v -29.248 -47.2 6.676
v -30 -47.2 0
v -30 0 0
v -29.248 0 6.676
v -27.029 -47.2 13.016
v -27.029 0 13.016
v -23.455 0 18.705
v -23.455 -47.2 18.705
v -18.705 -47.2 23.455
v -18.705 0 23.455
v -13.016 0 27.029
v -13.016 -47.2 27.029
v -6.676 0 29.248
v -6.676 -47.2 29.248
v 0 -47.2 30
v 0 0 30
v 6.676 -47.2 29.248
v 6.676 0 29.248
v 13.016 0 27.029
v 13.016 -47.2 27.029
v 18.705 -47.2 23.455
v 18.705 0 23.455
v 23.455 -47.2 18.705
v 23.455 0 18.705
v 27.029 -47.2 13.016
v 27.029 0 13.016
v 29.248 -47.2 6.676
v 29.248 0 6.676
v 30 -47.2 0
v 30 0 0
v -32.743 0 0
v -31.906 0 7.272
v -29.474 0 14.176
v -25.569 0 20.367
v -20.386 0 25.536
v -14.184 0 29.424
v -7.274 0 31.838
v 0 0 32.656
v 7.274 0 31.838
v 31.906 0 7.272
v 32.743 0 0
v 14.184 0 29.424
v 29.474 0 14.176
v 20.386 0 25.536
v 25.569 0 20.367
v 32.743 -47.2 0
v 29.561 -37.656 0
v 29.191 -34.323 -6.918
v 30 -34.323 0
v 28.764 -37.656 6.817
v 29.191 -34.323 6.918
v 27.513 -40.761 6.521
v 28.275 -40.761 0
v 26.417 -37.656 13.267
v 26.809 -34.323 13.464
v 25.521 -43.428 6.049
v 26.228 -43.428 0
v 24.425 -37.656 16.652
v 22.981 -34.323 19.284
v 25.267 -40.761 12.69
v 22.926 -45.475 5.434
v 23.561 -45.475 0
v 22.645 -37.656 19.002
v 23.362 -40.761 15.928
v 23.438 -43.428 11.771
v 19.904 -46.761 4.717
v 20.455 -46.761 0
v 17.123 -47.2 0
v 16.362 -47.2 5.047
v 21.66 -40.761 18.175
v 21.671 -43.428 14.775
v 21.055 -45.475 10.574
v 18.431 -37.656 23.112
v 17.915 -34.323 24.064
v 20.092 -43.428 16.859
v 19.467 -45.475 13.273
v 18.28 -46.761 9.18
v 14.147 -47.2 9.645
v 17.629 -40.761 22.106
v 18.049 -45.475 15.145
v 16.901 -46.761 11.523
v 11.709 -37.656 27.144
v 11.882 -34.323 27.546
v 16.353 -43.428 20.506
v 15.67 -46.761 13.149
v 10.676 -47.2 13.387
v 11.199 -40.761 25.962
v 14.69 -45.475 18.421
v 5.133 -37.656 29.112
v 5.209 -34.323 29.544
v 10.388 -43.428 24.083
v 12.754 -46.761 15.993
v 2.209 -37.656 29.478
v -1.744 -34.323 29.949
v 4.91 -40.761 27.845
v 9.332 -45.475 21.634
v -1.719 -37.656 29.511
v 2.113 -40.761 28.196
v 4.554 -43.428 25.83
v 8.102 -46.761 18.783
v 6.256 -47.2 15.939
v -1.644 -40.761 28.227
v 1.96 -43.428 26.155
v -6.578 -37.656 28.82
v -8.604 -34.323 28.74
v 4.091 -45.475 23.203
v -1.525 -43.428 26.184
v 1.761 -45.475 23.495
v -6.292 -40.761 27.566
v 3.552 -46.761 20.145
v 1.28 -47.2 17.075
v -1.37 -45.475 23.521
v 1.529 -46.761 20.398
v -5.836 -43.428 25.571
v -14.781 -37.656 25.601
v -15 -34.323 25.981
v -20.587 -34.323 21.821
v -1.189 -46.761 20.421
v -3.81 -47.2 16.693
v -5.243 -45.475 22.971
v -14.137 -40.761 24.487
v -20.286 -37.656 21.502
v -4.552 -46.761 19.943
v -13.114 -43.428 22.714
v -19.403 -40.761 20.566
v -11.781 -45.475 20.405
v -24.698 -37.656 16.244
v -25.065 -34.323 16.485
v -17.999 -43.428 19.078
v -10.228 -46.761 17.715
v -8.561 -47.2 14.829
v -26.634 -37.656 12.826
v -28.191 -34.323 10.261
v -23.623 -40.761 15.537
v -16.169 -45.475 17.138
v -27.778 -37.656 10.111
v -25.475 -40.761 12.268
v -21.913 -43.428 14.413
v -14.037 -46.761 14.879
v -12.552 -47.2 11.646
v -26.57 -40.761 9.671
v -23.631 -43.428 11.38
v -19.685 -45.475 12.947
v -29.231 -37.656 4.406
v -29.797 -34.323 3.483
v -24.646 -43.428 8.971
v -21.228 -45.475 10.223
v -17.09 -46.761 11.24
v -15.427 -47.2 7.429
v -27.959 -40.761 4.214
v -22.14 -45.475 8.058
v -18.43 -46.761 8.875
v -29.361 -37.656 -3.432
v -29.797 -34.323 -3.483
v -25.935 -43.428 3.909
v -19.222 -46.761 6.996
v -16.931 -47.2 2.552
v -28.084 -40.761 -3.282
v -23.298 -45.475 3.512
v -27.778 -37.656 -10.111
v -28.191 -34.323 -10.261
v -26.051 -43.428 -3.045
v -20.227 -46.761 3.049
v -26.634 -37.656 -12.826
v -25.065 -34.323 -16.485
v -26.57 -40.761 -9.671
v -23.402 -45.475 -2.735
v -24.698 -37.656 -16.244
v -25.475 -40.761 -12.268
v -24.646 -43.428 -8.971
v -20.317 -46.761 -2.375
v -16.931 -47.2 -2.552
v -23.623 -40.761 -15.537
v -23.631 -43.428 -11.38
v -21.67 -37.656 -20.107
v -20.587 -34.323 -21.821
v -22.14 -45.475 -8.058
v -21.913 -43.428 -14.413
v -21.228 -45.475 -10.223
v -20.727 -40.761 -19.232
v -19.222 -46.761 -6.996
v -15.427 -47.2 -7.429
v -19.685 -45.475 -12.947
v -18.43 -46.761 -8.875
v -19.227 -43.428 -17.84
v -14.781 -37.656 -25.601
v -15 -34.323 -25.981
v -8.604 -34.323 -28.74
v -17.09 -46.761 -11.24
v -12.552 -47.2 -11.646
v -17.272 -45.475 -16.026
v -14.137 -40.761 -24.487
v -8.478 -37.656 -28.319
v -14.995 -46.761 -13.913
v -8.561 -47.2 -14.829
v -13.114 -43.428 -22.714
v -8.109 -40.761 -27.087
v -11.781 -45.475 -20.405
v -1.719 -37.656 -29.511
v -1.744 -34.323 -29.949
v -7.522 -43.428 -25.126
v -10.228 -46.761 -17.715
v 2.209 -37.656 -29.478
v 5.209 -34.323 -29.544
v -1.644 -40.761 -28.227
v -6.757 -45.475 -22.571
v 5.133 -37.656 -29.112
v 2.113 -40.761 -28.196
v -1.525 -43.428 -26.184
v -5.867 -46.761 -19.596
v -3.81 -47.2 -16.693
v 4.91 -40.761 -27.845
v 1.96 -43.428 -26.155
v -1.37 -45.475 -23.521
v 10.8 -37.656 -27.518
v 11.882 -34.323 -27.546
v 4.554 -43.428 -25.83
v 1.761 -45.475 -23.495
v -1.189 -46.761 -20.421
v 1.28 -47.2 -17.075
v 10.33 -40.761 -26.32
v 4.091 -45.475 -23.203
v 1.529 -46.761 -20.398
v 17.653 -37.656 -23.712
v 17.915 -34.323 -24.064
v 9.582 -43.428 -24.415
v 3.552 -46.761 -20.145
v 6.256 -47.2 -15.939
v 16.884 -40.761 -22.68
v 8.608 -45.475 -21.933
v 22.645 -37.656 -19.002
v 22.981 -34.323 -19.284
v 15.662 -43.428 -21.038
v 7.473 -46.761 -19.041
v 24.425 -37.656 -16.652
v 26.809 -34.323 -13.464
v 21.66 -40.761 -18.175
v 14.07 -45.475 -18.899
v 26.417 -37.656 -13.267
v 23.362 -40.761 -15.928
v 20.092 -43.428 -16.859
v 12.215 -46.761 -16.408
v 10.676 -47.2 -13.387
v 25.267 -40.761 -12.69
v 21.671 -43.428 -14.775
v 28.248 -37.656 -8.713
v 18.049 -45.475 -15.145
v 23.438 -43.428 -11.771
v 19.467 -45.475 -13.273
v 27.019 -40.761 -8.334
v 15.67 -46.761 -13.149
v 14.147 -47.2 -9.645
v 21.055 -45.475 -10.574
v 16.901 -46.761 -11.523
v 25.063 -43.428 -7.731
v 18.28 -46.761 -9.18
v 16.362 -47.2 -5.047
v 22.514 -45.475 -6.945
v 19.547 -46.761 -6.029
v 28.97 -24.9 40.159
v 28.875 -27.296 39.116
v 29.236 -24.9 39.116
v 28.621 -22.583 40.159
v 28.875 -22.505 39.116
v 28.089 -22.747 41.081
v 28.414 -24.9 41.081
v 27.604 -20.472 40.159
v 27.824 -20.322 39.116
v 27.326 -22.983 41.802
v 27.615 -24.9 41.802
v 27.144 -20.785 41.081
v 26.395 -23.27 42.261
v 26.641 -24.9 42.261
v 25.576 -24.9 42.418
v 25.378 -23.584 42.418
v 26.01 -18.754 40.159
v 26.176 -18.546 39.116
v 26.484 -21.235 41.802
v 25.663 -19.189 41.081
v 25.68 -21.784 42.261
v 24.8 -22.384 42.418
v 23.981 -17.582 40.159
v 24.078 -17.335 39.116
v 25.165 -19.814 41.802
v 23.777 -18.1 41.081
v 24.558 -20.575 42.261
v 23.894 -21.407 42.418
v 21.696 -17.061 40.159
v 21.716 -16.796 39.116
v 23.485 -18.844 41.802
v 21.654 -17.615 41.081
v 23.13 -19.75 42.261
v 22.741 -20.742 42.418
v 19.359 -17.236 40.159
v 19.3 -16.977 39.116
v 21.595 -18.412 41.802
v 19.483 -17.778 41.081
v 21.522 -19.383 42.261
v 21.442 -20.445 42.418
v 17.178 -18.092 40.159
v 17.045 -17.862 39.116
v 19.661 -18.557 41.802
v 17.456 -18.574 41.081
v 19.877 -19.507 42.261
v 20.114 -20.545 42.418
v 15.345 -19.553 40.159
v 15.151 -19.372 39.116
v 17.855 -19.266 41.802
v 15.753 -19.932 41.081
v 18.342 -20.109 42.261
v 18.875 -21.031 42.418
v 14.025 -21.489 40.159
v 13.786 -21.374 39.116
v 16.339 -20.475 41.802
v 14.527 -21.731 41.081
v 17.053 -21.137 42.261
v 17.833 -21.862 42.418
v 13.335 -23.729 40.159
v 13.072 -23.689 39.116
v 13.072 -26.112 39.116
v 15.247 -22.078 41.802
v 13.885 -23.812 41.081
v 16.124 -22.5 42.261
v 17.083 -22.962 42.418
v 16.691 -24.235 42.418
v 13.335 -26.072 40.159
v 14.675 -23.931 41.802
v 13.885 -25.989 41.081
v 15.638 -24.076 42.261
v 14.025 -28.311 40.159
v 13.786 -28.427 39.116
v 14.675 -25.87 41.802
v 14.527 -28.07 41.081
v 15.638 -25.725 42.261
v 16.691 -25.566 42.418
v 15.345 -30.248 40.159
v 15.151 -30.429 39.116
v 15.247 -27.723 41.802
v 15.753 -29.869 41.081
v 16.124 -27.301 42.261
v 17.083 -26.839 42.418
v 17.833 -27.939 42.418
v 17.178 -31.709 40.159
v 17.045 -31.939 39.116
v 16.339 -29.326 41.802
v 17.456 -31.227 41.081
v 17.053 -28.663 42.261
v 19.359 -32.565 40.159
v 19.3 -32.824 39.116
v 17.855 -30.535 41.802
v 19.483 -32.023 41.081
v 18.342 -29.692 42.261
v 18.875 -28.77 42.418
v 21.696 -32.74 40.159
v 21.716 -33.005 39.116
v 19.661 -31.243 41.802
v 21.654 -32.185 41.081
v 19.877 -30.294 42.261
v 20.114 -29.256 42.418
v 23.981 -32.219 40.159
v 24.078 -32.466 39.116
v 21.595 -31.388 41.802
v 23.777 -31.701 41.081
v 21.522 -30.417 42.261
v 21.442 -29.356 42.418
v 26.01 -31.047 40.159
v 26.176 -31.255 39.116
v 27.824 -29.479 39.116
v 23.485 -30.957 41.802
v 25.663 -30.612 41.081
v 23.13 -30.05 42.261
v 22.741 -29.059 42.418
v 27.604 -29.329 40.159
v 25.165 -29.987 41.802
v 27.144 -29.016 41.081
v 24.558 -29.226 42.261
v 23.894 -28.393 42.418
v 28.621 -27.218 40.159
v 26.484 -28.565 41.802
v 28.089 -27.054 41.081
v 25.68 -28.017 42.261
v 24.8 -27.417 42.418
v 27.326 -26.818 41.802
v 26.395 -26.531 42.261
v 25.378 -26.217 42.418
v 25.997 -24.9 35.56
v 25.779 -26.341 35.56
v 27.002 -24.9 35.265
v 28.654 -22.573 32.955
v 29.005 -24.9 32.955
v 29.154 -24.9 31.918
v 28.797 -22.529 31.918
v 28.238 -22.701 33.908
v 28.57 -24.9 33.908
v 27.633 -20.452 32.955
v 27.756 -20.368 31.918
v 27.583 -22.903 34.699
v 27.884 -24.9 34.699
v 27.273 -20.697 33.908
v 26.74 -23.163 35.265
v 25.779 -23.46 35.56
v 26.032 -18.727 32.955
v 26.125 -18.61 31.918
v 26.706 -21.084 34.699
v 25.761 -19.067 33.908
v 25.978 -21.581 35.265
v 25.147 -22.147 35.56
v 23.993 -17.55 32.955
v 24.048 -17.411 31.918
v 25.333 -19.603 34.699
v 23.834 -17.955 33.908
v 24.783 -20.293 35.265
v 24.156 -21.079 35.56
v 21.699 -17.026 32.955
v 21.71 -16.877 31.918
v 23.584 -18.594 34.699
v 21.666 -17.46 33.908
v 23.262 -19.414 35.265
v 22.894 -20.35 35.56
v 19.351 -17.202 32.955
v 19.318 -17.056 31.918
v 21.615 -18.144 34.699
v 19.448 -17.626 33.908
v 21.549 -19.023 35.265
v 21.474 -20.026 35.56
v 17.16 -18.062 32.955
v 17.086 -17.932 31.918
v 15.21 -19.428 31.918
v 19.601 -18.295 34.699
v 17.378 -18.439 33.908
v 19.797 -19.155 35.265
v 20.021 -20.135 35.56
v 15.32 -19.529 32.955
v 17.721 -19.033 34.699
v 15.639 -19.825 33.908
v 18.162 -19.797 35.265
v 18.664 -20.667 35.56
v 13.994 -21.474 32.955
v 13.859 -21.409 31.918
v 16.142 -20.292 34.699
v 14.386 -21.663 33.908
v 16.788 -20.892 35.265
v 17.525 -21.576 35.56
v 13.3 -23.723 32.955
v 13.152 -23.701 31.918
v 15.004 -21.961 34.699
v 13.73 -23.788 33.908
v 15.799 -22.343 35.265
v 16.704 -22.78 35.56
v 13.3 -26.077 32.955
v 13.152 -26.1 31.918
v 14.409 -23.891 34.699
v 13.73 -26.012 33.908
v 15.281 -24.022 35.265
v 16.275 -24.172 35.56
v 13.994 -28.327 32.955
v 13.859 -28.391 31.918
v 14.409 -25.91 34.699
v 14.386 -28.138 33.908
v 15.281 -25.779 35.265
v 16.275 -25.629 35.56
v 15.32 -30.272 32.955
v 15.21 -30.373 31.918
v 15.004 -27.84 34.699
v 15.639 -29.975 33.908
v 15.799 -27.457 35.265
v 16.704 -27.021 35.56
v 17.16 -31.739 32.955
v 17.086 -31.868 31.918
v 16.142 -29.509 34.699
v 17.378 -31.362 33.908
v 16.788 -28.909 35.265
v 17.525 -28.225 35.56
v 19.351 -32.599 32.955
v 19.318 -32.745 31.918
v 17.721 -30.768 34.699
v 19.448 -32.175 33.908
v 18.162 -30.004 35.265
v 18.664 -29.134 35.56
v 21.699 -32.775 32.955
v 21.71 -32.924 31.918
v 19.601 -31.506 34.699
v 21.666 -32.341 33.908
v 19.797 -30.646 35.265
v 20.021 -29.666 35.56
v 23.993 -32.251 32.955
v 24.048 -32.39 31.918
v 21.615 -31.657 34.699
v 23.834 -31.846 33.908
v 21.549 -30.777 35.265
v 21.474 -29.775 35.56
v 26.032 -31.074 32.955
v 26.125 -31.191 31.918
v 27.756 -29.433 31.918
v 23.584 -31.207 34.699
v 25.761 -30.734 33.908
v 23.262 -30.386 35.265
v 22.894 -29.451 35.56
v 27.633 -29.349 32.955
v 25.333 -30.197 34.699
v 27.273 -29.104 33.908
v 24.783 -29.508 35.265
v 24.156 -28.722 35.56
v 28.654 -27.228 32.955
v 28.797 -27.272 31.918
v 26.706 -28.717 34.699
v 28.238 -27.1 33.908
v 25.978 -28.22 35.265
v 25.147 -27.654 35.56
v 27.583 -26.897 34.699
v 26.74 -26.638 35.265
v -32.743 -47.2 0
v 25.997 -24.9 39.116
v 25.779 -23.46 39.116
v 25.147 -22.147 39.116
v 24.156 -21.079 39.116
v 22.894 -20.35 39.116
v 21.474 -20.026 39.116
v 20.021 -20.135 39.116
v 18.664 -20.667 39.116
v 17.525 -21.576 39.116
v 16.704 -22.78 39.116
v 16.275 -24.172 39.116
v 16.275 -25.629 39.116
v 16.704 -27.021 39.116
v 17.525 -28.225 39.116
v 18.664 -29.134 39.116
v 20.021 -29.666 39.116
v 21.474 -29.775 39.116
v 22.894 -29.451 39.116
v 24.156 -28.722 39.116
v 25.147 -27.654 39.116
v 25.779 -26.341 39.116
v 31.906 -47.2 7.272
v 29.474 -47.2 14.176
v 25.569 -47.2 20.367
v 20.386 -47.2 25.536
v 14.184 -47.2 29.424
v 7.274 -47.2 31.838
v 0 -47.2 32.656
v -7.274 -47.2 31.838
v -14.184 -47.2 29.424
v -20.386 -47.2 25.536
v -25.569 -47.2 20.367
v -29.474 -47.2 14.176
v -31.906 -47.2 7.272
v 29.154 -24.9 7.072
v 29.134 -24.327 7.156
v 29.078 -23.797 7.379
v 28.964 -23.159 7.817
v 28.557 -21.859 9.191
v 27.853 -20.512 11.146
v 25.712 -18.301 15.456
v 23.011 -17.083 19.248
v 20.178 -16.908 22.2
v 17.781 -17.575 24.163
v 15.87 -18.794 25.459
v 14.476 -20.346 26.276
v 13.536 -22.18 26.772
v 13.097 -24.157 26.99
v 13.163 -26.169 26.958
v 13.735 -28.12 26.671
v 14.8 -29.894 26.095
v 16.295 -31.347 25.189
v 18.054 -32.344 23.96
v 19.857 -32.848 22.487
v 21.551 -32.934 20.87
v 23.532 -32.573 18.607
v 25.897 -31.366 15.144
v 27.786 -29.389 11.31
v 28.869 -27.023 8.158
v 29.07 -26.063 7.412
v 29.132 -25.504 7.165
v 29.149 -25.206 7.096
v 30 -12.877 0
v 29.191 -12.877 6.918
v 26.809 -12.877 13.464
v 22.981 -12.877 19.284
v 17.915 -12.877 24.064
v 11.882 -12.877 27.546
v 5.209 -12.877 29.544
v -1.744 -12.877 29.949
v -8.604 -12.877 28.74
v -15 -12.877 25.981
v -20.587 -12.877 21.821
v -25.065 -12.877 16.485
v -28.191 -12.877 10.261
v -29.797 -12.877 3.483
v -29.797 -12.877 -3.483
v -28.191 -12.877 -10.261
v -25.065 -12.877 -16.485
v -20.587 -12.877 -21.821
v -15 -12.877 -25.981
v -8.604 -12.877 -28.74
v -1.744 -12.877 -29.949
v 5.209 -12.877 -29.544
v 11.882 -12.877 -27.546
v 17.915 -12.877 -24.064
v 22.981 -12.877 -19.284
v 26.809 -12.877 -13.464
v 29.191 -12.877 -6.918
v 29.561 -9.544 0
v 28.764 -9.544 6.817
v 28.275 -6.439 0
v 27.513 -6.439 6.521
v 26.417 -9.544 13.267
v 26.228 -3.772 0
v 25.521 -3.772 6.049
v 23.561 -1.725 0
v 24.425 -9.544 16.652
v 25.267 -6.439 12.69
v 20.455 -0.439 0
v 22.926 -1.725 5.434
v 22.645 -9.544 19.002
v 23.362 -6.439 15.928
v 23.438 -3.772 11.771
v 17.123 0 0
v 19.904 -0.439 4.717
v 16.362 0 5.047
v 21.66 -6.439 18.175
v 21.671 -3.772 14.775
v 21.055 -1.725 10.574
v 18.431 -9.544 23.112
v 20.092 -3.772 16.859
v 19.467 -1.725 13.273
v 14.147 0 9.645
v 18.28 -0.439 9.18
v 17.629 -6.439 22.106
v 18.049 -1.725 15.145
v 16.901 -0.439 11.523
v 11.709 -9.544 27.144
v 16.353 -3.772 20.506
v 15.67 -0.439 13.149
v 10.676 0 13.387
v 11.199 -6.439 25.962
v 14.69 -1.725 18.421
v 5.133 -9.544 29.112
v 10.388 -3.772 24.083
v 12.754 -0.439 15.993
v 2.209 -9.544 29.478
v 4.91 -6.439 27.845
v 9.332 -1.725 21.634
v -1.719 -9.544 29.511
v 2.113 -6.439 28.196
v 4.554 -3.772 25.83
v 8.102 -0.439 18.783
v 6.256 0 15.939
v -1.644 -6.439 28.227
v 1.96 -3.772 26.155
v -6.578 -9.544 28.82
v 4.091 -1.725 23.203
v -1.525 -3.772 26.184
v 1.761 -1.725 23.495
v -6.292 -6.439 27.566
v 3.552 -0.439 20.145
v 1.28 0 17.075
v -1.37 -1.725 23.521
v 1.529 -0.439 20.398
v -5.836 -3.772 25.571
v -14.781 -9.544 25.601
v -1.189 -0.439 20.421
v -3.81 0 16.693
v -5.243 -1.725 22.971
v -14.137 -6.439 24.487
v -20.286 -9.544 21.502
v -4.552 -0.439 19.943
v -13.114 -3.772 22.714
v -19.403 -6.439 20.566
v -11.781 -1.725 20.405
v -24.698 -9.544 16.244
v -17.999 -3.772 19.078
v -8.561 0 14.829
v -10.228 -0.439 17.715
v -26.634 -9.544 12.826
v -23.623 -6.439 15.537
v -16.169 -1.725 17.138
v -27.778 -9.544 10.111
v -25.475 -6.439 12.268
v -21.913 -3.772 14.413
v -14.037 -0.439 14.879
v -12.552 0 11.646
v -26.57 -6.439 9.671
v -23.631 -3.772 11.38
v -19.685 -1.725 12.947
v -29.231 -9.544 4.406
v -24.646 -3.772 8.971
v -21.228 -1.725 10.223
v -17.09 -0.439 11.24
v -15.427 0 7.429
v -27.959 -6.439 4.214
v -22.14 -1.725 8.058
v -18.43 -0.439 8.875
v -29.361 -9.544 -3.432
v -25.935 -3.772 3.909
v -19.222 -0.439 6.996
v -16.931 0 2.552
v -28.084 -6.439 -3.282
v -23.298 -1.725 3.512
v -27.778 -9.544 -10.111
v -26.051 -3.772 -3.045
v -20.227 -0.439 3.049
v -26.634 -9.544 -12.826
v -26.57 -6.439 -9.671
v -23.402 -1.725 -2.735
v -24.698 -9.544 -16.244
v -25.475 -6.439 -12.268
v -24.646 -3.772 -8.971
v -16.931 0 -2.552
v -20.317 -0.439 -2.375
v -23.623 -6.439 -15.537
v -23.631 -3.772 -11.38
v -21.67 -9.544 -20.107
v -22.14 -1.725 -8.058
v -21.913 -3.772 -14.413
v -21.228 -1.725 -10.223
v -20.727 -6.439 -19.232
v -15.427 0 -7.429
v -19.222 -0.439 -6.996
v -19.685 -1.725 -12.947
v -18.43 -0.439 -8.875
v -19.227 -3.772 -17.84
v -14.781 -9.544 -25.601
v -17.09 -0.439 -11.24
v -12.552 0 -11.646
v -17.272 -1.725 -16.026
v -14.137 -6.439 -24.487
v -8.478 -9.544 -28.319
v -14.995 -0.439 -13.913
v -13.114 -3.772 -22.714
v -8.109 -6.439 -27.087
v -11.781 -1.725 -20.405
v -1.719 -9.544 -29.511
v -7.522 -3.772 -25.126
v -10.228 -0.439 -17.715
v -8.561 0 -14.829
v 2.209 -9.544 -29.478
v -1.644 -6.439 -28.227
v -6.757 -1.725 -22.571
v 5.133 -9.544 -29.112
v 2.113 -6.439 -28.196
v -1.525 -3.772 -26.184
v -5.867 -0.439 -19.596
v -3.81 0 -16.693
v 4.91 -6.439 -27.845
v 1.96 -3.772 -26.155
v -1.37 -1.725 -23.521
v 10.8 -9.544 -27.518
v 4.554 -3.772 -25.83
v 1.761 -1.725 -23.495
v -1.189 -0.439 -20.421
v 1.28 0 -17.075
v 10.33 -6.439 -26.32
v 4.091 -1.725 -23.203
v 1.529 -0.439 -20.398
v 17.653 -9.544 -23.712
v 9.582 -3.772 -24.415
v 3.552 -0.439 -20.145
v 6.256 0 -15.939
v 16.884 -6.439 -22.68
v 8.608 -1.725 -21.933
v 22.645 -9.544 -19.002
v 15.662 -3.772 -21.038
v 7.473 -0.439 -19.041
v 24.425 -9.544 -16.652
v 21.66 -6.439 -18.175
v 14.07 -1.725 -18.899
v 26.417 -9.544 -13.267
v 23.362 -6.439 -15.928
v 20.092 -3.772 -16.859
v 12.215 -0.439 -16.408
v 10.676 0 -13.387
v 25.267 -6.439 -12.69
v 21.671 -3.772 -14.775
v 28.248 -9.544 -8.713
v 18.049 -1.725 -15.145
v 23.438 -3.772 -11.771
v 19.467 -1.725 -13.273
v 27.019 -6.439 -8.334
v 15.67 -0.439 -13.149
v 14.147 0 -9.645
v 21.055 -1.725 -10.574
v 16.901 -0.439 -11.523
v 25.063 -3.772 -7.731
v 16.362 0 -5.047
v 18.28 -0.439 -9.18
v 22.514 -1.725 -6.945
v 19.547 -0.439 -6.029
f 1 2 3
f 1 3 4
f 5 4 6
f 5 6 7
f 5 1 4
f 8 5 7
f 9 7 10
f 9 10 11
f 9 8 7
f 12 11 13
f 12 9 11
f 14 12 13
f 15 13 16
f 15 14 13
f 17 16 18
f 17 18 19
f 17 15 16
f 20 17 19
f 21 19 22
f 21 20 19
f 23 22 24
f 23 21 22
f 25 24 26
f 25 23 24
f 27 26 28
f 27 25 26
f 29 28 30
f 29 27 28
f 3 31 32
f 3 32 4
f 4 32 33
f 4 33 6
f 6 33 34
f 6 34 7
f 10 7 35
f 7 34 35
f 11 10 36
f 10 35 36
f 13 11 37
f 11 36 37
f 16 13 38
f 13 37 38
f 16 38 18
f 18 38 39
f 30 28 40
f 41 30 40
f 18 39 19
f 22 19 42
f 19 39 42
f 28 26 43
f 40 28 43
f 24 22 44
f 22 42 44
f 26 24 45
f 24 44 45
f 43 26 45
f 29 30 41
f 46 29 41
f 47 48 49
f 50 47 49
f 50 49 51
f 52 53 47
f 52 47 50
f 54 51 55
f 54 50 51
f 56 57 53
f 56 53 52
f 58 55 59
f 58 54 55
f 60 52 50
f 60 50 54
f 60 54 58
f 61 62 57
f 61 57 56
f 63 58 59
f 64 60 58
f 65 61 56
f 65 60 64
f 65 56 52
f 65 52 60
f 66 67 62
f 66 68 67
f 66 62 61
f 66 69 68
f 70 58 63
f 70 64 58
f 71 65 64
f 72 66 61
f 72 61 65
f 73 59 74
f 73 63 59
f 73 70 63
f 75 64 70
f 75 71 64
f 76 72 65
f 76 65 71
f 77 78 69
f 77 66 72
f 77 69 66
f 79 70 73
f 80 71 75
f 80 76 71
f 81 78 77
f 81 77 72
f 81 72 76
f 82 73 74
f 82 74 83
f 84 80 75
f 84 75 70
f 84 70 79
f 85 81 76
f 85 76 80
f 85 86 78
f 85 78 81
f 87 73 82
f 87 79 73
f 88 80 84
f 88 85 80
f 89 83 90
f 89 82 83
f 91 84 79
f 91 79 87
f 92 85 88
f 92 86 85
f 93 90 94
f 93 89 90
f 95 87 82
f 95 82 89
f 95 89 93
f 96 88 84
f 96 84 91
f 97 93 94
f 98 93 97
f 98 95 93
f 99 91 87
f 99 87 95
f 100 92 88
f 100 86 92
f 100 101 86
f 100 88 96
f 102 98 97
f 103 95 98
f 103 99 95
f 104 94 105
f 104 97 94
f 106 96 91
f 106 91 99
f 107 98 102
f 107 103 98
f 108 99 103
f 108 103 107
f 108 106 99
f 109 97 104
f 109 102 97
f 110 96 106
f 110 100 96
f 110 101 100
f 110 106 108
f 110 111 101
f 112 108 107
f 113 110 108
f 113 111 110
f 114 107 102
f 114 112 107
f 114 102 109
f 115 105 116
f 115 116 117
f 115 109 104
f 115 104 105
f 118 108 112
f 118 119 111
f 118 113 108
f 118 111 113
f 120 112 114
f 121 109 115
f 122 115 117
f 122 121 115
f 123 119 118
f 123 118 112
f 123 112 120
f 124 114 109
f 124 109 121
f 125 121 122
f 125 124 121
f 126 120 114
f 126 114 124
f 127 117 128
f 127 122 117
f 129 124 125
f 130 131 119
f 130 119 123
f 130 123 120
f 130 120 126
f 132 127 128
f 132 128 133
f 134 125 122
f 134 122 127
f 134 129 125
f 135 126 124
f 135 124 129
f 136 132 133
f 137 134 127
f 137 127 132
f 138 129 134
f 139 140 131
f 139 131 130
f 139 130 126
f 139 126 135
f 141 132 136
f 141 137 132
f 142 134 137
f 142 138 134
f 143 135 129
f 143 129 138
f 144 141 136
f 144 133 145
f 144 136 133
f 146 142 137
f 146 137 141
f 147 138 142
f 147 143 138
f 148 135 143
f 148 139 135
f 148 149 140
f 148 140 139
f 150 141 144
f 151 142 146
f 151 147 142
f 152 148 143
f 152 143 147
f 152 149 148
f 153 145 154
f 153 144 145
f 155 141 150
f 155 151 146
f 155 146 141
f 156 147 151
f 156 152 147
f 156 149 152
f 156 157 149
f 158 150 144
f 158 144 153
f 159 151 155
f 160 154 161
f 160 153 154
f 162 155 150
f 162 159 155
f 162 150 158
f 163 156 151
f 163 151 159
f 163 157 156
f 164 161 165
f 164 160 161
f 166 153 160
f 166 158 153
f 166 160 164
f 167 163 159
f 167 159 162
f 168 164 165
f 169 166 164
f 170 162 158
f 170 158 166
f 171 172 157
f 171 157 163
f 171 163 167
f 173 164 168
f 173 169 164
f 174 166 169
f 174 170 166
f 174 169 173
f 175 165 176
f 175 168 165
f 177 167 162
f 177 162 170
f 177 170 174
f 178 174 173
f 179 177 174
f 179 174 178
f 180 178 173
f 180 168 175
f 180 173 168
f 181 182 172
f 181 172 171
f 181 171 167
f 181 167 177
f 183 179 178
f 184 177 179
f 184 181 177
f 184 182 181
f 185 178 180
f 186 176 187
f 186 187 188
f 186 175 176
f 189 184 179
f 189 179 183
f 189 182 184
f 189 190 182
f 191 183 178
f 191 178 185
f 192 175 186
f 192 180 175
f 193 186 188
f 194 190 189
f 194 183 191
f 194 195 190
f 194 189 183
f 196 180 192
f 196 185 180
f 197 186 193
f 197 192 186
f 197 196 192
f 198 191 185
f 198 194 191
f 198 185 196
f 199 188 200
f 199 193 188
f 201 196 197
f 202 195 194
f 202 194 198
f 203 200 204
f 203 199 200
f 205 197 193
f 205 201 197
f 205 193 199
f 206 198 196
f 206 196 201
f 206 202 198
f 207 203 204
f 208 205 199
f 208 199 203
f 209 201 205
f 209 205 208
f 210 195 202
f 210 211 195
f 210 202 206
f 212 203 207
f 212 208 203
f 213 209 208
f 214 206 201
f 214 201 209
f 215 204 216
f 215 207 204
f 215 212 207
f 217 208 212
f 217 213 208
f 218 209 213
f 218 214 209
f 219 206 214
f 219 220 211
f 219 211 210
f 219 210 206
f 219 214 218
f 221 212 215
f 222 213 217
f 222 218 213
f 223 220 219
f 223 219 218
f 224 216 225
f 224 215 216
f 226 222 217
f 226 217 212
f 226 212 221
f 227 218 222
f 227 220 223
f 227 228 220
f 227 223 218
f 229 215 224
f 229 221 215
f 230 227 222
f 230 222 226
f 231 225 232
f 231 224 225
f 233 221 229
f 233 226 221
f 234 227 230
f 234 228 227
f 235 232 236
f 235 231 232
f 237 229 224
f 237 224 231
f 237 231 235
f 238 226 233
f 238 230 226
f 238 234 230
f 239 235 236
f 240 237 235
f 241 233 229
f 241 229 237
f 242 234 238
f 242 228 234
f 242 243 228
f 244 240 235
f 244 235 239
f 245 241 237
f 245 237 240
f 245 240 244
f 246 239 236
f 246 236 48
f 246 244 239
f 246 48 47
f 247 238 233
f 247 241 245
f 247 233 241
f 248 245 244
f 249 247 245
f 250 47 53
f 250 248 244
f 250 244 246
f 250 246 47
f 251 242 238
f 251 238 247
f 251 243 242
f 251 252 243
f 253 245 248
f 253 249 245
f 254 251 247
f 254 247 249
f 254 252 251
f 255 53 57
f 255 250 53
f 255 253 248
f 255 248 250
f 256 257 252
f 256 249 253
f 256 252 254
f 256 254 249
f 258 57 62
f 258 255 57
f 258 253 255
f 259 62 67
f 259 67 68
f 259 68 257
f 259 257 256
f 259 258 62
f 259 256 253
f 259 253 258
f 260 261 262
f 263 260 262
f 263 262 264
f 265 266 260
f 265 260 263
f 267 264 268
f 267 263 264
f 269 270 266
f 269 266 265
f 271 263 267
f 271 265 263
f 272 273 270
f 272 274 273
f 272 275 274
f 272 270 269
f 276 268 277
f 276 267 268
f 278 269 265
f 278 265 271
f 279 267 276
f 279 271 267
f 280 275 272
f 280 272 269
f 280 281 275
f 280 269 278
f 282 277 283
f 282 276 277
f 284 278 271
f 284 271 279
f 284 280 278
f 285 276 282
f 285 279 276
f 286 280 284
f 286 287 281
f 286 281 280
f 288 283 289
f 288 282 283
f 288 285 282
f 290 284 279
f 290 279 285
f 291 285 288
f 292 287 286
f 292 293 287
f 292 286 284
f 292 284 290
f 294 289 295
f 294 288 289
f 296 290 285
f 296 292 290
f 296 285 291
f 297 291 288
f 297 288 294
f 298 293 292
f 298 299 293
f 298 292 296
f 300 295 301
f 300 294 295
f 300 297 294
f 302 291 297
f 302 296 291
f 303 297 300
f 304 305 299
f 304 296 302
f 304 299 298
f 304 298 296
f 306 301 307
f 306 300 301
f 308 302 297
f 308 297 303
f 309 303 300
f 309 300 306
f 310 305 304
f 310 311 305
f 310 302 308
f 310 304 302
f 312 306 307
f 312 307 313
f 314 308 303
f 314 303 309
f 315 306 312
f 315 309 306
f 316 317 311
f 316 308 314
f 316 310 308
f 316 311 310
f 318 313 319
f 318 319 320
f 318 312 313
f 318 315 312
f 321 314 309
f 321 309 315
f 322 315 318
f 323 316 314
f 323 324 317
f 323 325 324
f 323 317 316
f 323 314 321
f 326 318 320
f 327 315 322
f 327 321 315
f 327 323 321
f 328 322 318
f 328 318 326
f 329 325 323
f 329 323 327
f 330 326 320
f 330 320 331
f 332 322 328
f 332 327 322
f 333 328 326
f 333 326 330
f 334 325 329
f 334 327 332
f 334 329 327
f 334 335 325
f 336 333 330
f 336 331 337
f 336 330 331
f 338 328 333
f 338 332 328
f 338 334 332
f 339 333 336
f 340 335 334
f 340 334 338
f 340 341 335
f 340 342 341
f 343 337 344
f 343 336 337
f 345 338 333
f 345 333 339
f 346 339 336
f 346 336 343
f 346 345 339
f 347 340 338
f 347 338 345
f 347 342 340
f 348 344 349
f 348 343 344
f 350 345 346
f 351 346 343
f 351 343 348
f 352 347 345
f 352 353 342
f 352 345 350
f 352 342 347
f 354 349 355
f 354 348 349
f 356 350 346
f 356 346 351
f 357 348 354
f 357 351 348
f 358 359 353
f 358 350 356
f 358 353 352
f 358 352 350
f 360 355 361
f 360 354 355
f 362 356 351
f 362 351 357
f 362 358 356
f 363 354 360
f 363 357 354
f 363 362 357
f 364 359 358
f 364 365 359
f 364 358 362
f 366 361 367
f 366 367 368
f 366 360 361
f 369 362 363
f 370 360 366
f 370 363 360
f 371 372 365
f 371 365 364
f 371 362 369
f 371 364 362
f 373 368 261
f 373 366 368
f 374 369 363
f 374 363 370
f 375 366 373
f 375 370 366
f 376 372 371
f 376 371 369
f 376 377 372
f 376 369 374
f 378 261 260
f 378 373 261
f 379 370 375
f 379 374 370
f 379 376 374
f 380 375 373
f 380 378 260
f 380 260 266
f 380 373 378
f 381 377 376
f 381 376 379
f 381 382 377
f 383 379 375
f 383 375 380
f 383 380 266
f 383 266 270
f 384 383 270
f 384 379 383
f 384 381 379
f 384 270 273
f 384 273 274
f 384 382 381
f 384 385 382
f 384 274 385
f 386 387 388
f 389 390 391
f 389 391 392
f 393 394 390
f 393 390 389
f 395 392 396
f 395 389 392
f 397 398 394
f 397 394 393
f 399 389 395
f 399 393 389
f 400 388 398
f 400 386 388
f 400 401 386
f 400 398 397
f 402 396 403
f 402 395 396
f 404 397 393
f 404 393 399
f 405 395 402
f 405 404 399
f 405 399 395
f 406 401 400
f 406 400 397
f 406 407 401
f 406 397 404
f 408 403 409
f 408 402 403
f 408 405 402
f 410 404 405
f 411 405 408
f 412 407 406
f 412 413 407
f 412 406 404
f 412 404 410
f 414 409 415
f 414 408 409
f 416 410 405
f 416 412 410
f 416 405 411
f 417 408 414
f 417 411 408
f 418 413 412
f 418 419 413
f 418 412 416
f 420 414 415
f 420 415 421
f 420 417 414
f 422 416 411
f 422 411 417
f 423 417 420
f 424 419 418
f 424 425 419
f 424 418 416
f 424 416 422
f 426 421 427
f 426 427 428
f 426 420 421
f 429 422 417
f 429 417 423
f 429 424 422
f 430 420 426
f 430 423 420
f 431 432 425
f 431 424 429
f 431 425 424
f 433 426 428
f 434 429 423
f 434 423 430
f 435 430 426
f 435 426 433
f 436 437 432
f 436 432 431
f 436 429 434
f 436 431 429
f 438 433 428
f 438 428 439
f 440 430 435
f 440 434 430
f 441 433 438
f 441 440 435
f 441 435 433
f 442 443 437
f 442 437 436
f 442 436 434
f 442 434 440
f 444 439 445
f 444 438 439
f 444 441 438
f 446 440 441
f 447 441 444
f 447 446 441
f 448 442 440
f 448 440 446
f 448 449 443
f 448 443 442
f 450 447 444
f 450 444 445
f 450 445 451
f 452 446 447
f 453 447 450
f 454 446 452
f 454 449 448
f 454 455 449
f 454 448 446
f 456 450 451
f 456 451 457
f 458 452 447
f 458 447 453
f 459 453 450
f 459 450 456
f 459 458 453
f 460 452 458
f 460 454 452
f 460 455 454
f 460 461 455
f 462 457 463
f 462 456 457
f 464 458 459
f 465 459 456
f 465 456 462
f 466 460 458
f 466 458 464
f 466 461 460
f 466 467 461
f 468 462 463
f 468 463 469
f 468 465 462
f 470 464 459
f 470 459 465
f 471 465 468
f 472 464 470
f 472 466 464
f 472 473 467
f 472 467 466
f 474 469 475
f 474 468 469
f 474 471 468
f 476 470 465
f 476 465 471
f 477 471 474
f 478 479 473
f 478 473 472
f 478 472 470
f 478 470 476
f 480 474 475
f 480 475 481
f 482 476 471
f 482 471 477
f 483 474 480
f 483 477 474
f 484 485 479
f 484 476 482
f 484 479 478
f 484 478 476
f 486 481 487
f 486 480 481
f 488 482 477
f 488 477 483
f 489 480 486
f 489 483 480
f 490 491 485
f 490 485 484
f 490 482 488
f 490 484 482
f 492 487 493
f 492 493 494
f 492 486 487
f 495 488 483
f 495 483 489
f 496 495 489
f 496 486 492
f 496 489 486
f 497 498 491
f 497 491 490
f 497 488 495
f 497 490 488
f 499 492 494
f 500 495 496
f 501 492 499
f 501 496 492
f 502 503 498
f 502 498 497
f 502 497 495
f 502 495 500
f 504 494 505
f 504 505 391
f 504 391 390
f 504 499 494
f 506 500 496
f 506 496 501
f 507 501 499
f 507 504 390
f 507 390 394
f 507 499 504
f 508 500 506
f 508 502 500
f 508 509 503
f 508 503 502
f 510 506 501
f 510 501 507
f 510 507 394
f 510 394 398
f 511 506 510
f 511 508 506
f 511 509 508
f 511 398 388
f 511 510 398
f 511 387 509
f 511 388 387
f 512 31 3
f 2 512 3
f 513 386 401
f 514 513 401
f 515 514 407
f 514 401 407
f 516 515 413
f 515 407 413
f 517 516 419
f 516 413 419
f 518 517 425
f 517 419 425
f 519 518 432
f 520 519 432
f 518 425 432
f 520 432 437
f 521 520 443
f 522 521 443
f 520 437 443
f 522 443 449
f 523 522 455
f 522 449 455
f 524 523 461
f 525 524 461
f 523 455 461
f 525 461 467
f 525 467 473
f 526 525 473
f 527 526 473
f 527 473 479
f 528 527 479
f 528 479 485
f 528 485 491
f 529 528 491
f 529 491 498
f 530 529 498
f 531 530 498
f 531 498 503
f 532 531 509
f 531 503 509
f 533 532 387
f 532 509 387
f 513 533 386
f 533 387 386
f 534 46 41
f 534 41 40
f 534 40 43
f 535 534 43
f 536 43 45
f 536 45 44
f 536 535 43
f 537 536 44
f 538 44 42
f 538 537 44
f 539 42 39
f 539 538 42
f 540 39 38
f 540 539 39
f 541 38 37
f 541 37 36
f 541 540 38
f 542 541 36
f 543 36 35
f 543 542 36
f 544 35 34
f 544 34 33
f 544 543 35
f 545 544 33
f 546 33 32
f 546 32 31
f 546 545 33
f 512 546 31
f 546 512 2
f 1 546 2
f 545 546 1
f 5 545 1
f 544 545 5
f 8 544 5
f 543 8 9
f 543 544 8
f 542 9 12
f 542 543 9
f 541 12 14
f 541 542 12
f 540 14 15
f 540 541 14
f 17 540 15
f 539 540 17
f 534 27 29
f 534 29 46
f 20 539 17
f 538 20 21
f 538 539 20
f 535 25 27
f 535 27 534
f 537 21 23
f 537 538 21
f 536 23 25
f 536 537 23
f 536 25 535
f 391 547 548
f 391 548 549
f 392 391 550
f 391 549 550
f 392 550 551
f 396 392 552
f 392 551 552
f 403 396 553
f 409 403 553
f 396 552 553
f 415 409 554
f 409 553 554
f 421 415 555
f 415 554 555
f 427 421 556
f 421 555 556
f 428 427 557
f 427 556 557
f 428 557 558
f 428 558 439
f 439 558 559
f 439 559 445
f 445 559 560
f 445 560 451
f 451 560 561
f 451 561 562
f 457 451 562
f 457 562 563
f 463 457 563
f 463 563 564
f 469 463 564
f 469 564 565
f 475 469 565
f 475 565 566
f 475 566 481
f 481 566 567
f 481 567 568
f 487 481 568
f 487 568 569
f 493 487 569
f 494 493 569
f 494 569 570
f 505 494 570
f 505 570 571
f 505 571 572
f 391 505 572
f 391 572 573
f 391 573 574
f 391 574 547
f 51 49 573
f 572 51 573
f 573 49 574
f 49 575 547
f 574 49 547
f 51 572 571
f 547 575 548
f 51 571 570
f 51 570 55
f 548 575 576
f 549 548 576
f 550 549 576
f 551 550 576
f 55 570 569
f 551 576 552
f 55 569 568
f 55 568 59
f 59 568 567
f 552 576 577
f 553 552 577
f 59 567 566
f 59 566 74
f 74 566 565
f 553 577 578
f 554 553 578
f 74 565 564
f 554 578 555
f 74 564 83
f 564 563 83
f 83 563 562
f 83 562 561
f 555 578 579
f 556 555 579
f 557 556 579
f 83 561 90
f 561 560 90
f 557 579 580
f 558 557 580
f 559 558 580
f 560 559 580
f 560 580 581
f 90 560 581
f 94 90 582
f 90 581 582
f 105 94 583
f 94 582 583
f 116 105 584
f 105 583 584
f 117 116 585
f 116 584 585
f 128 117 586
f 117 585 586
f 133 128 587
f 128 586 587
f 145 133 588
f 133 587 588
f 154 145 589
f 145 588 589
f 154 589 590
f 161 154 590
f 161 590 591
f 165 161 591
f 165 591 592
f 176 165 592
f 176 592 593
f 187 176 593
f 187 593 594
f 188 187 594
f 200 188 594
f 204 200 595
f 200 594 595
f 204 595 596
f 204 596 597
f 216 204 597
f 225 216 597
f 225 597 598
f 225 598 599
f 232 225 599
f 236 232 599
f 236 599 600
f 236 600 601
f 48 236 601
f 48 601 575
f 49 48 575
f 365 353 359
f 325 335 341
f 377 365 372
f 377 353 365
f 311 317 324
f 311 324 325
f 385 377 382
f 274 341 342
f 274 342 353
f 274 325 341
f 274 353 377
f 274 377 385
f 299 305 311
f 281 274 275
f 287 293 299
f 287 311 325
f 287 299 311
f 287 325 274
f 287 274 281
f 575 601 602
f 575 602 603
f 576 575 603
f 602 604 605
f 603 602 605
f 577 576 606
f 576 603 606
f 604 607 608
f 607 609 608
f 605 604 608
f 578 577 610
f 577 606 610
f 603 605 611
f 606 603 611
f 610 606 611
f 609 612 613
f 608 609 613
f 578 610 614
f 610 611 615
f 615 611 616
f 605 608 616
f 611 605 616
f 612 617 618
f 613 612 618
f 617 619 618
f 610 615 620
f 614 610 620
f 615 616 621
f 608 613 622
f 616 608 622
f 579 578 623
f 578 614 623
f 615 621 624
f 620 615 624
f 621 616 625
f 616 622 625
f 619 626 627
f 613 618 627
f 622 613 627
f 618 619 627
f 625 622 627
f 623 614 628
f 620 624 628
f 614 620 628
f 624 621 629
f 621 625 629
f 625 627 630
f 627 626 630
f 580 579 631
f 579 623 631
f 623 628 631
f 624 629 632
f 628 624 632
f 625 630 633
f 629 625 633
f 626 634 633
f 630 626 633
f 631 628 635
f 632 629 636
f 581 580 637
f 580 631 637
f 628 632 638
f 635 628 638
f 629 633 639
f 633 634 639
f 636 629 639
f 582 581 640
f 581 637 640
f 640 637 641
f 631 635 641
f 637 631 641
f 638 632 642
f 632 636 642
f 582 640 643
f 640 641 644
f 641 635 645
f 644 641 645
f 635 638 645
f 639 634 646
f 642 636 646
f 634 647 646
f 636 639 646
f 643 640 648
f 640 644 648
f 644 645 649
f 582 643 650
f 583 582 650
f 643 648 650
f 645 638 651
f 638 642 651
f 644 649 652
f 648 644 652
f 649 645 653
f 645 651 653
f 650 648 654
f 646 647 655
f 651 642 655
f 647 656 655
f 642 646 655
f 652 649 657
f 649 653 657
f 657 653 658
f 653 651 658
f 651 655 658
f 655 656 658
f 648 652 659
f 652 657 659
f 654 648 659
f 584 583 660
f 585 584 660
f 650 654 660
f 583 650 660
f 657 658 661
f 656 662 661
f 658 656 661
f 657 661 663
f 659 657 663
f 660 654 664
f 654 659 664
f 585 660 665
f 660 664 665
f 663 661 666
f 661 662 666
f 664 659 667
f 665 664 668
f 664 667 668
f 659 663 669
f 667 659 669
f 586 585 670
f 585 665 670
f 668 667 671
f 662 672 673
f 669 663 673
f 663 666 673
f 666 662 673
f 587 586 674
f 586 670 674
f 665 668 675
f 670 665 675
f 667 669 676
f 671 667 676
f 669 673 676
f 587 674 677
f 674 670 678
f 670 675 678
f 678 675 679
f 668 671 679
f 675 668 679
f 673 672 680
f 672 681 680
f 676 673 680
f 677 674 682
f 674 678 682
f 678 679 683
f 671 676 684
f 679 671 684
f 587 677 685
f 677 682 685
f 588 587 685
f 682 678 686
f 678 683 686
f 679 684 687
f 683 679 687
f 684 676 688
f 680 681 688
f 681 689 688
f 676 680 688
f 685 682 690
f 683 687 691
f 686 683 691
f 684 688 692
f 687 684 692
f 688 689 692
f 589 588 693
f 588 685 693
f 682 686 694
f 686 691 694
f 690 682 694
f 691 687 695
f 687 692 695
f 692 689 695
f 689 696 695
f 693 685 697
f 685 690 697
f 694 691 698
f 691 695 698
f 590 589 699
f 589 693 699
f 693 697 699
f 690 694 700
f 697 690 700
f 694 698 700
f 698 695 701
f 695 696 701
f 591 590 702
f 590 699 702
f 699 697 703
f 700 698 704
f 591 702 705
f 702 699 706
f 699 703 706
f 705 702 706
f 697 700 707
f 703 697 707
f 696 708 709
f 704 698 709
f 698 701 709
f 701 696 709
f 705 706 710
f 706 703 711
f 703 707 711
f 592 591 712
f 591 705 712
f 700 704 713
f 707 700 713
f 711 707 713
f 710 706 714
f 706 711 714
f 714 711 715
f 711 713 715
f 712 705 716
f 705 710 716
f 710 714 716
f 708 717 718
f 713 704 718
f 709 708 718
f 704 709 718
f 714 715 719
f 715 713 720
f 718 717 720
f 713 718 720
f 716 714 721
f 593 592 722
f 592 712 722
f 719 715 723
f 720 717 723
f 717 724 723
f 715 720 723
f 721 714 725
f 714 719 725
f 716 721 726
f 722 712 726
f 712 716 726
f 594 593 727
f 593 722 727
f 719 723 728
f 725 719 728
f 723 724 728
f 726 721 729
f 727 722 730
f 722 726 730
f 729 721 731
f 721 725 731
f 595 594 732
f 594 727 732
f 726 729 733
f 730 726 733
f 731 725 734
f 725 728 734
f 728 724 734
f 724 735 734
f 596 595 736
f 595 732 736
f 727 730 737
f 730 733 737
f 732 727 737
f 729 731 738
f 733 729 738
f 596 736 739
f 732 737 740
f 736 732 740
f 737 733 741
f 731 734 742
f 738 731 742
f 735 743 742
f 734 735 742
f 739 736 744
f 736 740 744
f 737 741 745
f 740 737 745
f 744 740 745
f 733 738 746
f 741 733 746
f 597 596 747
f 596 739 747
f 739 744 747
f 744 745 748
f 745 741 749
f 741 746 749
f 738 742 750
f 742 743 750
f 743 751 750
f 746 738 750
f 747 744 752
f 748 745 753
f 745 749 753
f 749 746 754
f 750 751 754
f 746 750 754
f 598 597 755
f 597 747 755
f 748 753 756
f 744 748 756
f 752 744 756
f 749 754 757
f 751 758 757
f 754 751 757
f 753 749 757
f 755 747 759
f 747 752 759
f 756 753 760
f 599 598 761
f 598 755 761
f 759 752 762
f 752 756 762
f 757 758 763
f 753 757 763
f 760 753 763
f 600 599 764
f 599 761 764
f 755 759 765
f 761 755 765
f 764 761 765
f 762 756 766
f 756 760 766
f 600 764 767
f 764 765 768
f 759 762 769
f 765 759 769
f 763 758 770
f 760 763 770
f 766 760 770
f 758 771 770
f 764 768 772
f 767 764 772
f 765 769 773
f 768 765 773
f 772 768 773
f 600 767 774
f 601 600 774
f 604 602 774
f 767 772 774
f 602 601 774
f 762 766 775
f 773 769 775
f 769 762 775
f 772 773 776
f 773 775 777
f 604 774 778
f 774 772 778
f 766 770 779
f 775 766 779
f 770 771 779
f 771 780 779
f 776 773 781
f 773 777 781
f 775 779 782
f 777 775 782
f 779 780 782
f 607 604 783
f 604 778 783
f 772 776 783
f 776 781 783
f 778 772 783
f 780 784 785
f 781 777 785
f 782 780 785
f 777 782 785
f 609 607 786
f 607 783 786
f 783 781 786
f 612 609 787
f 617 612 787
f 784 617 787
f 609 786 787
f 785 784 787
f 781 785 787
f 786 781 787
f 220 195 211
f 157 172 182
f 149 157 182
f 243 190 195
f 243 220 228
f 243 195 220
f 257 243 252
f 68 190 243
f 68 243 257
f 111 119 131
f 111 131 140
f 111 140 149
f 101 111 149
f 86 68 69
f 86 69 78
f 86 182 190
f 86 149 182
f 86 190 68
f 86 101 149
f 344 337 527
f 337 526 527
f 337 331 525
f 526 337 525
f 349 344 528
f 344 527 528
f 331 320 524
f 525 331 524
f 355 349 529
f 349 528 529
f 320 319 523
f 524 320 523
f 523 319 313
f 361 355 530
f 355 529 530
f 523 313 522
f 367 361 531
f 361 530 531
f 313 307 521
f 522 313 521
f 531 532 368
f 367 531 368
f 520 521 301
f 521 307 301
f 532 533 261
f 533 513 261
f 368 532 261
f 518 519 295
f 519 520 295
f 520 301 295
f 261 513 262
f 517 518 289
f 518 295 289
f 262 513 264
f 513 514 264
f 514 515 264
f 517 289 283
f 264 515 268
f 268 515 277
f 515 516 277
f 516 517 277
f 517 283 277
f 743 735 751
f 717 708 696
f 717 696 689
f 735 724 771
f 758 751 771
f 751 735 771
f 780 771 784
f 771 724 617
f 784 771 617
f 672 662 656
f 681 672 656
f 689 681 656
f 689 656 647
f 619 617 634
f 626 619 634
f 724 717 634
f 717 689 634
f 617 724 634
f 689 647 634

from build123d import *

# Parameters (mm, degrees)
F0_R      = 29.99994
F1_DEPTH  = 47.2000072
F4_R      = 8.0459114743
F5_DEPTH  = 35.56
F6_R      = 4.8880627921
F7_DEPTH  = 3.556
F8_R      = 8.1274992905
F9_DEPTH  = 3.302
F11_DEPTH = 47.2004644
F12_R     = 12.8774151417


# Not quite as in the source:
# - a fillet or chamfer that OpenCascade refuses, or shapes differently, is made with other operations: its cross-section is extruded or revolved along the edge and cut away or added
# - the program builds the solid bodies; features that only make, move or delete a surface that nothing else refers to are left out


with BuildPart() as f1:
    # F0 (on Front) → F1 (new body)
    with BuildSketch(Plane.XZ):
        Circle(F0_R)
    extrude(amount=F1_DEPTH)

    # F4 (on Top) → F5 (join)
    with BuildSketch(Plane.XY):
        with Locations((21.1084838957, -24.9004270881)):
            Circle(F4_R)
    extrude(amount=F5_DEPTH)

    # F6 (on face) → F7 (join)
    with BuildSketch(Plane.XY.offset(35.56)):
        with Locations((21.1084838957, -24.9004270881)):
            Circle(F6_R)
    extrude(amount=F7_DEPTH)

    # F8 (on face) → F9 (join)
    with BuildSketch(Plane.XY.offset(39.116)):
        with Locations((21.1084838957, -24.9004270881)):
            Circle(F8_R)
    extrude(amount=F9_DEPTH)

    # F12
    f12_edges = [f1.edges().sort_by_distance(p)[0] for p in [
        (-29.99994, 0, 0),
        (-29.99994, -47.200007, 0),
    ]]
    fillet(f12_edges, radius=F12_R)

    # F13: fillet of radius 3.6792614691 on 1 edges, made by hand

    # F13_s1 → F13_t2 (revolve, cut)
    with BuildSketch(Plane.XZ.offset(24.9004270881)):
        with BuildLine():
            ThreePointArc((29.1543953699, 31.9178723714), (28.2550061042, 34.3281162367), (25.9965466878, 35.56))
            Line((25.9965466878, 35.56), (26.0069749435, 35.6328425526))
            ThreePointArc((26.0069749435, 35.6328425526), (27.5754710288, 35.6335852294), (29.1543953699, 35.6335852294))
            Line((29.1543953699, 35.6335852294), (29.2279805993, 35.56))
            Line((29.2279805993, 35.56), (29.2279805993, 31.9178723714))
            Line((29.2279805993, 31.9178723714), (29.1543953699, 31.9178723714))
        make_face()
    revolve(axis=Axis((21.1084838957, -24.9004270881, 35.56), (0, 0, 1)), mode=Mode.SUBTRACT)

    # F14: fillet of radius 3.6792614691 on 1 edges, made by hand

    # F14_s1 → F14_t2 (revolve, cut)
    with BuildSketch(Plane.XZ.offset(24.9004270881)):
        with BuildLine():
            ThreePointArc((29.2359831862, 39.116), (28.0407566088, 41.4704969888), (25.576114508, 42.418))
            Line((25.576114508, 42.418), (29.2359831862, 42.418))
            Line((29.2359831862, 42.418), (29.2359831862, 39.116))
        make_face()
    revolve(axis=Axis((21.1084838957, -24.9004270881, 42.418), (0, 0, 1)), mode=Mode.SUBTRACT)


with BuildPart() as f11:
    # F10 (on face) → F11 (new body)
    with BuildSketch(Plane.XZ.offset(47.2000072)):
        with BuildLine():
            ThreePointArc((-29.99994, 0), (0, 29.99994), (29.99994, 0))
            Line((29.99994, 0), (32.74314, 0))
            ThreePointArc((32.74314, 0), (0, 32.6558421266), (-32.74314, 0))
            Line((-32.74314, 0), (-29.99994, 0))
        make_face()
    extrude(amount=-F11_DEPTH)


solid = Compound([f1.part, f11.part])
